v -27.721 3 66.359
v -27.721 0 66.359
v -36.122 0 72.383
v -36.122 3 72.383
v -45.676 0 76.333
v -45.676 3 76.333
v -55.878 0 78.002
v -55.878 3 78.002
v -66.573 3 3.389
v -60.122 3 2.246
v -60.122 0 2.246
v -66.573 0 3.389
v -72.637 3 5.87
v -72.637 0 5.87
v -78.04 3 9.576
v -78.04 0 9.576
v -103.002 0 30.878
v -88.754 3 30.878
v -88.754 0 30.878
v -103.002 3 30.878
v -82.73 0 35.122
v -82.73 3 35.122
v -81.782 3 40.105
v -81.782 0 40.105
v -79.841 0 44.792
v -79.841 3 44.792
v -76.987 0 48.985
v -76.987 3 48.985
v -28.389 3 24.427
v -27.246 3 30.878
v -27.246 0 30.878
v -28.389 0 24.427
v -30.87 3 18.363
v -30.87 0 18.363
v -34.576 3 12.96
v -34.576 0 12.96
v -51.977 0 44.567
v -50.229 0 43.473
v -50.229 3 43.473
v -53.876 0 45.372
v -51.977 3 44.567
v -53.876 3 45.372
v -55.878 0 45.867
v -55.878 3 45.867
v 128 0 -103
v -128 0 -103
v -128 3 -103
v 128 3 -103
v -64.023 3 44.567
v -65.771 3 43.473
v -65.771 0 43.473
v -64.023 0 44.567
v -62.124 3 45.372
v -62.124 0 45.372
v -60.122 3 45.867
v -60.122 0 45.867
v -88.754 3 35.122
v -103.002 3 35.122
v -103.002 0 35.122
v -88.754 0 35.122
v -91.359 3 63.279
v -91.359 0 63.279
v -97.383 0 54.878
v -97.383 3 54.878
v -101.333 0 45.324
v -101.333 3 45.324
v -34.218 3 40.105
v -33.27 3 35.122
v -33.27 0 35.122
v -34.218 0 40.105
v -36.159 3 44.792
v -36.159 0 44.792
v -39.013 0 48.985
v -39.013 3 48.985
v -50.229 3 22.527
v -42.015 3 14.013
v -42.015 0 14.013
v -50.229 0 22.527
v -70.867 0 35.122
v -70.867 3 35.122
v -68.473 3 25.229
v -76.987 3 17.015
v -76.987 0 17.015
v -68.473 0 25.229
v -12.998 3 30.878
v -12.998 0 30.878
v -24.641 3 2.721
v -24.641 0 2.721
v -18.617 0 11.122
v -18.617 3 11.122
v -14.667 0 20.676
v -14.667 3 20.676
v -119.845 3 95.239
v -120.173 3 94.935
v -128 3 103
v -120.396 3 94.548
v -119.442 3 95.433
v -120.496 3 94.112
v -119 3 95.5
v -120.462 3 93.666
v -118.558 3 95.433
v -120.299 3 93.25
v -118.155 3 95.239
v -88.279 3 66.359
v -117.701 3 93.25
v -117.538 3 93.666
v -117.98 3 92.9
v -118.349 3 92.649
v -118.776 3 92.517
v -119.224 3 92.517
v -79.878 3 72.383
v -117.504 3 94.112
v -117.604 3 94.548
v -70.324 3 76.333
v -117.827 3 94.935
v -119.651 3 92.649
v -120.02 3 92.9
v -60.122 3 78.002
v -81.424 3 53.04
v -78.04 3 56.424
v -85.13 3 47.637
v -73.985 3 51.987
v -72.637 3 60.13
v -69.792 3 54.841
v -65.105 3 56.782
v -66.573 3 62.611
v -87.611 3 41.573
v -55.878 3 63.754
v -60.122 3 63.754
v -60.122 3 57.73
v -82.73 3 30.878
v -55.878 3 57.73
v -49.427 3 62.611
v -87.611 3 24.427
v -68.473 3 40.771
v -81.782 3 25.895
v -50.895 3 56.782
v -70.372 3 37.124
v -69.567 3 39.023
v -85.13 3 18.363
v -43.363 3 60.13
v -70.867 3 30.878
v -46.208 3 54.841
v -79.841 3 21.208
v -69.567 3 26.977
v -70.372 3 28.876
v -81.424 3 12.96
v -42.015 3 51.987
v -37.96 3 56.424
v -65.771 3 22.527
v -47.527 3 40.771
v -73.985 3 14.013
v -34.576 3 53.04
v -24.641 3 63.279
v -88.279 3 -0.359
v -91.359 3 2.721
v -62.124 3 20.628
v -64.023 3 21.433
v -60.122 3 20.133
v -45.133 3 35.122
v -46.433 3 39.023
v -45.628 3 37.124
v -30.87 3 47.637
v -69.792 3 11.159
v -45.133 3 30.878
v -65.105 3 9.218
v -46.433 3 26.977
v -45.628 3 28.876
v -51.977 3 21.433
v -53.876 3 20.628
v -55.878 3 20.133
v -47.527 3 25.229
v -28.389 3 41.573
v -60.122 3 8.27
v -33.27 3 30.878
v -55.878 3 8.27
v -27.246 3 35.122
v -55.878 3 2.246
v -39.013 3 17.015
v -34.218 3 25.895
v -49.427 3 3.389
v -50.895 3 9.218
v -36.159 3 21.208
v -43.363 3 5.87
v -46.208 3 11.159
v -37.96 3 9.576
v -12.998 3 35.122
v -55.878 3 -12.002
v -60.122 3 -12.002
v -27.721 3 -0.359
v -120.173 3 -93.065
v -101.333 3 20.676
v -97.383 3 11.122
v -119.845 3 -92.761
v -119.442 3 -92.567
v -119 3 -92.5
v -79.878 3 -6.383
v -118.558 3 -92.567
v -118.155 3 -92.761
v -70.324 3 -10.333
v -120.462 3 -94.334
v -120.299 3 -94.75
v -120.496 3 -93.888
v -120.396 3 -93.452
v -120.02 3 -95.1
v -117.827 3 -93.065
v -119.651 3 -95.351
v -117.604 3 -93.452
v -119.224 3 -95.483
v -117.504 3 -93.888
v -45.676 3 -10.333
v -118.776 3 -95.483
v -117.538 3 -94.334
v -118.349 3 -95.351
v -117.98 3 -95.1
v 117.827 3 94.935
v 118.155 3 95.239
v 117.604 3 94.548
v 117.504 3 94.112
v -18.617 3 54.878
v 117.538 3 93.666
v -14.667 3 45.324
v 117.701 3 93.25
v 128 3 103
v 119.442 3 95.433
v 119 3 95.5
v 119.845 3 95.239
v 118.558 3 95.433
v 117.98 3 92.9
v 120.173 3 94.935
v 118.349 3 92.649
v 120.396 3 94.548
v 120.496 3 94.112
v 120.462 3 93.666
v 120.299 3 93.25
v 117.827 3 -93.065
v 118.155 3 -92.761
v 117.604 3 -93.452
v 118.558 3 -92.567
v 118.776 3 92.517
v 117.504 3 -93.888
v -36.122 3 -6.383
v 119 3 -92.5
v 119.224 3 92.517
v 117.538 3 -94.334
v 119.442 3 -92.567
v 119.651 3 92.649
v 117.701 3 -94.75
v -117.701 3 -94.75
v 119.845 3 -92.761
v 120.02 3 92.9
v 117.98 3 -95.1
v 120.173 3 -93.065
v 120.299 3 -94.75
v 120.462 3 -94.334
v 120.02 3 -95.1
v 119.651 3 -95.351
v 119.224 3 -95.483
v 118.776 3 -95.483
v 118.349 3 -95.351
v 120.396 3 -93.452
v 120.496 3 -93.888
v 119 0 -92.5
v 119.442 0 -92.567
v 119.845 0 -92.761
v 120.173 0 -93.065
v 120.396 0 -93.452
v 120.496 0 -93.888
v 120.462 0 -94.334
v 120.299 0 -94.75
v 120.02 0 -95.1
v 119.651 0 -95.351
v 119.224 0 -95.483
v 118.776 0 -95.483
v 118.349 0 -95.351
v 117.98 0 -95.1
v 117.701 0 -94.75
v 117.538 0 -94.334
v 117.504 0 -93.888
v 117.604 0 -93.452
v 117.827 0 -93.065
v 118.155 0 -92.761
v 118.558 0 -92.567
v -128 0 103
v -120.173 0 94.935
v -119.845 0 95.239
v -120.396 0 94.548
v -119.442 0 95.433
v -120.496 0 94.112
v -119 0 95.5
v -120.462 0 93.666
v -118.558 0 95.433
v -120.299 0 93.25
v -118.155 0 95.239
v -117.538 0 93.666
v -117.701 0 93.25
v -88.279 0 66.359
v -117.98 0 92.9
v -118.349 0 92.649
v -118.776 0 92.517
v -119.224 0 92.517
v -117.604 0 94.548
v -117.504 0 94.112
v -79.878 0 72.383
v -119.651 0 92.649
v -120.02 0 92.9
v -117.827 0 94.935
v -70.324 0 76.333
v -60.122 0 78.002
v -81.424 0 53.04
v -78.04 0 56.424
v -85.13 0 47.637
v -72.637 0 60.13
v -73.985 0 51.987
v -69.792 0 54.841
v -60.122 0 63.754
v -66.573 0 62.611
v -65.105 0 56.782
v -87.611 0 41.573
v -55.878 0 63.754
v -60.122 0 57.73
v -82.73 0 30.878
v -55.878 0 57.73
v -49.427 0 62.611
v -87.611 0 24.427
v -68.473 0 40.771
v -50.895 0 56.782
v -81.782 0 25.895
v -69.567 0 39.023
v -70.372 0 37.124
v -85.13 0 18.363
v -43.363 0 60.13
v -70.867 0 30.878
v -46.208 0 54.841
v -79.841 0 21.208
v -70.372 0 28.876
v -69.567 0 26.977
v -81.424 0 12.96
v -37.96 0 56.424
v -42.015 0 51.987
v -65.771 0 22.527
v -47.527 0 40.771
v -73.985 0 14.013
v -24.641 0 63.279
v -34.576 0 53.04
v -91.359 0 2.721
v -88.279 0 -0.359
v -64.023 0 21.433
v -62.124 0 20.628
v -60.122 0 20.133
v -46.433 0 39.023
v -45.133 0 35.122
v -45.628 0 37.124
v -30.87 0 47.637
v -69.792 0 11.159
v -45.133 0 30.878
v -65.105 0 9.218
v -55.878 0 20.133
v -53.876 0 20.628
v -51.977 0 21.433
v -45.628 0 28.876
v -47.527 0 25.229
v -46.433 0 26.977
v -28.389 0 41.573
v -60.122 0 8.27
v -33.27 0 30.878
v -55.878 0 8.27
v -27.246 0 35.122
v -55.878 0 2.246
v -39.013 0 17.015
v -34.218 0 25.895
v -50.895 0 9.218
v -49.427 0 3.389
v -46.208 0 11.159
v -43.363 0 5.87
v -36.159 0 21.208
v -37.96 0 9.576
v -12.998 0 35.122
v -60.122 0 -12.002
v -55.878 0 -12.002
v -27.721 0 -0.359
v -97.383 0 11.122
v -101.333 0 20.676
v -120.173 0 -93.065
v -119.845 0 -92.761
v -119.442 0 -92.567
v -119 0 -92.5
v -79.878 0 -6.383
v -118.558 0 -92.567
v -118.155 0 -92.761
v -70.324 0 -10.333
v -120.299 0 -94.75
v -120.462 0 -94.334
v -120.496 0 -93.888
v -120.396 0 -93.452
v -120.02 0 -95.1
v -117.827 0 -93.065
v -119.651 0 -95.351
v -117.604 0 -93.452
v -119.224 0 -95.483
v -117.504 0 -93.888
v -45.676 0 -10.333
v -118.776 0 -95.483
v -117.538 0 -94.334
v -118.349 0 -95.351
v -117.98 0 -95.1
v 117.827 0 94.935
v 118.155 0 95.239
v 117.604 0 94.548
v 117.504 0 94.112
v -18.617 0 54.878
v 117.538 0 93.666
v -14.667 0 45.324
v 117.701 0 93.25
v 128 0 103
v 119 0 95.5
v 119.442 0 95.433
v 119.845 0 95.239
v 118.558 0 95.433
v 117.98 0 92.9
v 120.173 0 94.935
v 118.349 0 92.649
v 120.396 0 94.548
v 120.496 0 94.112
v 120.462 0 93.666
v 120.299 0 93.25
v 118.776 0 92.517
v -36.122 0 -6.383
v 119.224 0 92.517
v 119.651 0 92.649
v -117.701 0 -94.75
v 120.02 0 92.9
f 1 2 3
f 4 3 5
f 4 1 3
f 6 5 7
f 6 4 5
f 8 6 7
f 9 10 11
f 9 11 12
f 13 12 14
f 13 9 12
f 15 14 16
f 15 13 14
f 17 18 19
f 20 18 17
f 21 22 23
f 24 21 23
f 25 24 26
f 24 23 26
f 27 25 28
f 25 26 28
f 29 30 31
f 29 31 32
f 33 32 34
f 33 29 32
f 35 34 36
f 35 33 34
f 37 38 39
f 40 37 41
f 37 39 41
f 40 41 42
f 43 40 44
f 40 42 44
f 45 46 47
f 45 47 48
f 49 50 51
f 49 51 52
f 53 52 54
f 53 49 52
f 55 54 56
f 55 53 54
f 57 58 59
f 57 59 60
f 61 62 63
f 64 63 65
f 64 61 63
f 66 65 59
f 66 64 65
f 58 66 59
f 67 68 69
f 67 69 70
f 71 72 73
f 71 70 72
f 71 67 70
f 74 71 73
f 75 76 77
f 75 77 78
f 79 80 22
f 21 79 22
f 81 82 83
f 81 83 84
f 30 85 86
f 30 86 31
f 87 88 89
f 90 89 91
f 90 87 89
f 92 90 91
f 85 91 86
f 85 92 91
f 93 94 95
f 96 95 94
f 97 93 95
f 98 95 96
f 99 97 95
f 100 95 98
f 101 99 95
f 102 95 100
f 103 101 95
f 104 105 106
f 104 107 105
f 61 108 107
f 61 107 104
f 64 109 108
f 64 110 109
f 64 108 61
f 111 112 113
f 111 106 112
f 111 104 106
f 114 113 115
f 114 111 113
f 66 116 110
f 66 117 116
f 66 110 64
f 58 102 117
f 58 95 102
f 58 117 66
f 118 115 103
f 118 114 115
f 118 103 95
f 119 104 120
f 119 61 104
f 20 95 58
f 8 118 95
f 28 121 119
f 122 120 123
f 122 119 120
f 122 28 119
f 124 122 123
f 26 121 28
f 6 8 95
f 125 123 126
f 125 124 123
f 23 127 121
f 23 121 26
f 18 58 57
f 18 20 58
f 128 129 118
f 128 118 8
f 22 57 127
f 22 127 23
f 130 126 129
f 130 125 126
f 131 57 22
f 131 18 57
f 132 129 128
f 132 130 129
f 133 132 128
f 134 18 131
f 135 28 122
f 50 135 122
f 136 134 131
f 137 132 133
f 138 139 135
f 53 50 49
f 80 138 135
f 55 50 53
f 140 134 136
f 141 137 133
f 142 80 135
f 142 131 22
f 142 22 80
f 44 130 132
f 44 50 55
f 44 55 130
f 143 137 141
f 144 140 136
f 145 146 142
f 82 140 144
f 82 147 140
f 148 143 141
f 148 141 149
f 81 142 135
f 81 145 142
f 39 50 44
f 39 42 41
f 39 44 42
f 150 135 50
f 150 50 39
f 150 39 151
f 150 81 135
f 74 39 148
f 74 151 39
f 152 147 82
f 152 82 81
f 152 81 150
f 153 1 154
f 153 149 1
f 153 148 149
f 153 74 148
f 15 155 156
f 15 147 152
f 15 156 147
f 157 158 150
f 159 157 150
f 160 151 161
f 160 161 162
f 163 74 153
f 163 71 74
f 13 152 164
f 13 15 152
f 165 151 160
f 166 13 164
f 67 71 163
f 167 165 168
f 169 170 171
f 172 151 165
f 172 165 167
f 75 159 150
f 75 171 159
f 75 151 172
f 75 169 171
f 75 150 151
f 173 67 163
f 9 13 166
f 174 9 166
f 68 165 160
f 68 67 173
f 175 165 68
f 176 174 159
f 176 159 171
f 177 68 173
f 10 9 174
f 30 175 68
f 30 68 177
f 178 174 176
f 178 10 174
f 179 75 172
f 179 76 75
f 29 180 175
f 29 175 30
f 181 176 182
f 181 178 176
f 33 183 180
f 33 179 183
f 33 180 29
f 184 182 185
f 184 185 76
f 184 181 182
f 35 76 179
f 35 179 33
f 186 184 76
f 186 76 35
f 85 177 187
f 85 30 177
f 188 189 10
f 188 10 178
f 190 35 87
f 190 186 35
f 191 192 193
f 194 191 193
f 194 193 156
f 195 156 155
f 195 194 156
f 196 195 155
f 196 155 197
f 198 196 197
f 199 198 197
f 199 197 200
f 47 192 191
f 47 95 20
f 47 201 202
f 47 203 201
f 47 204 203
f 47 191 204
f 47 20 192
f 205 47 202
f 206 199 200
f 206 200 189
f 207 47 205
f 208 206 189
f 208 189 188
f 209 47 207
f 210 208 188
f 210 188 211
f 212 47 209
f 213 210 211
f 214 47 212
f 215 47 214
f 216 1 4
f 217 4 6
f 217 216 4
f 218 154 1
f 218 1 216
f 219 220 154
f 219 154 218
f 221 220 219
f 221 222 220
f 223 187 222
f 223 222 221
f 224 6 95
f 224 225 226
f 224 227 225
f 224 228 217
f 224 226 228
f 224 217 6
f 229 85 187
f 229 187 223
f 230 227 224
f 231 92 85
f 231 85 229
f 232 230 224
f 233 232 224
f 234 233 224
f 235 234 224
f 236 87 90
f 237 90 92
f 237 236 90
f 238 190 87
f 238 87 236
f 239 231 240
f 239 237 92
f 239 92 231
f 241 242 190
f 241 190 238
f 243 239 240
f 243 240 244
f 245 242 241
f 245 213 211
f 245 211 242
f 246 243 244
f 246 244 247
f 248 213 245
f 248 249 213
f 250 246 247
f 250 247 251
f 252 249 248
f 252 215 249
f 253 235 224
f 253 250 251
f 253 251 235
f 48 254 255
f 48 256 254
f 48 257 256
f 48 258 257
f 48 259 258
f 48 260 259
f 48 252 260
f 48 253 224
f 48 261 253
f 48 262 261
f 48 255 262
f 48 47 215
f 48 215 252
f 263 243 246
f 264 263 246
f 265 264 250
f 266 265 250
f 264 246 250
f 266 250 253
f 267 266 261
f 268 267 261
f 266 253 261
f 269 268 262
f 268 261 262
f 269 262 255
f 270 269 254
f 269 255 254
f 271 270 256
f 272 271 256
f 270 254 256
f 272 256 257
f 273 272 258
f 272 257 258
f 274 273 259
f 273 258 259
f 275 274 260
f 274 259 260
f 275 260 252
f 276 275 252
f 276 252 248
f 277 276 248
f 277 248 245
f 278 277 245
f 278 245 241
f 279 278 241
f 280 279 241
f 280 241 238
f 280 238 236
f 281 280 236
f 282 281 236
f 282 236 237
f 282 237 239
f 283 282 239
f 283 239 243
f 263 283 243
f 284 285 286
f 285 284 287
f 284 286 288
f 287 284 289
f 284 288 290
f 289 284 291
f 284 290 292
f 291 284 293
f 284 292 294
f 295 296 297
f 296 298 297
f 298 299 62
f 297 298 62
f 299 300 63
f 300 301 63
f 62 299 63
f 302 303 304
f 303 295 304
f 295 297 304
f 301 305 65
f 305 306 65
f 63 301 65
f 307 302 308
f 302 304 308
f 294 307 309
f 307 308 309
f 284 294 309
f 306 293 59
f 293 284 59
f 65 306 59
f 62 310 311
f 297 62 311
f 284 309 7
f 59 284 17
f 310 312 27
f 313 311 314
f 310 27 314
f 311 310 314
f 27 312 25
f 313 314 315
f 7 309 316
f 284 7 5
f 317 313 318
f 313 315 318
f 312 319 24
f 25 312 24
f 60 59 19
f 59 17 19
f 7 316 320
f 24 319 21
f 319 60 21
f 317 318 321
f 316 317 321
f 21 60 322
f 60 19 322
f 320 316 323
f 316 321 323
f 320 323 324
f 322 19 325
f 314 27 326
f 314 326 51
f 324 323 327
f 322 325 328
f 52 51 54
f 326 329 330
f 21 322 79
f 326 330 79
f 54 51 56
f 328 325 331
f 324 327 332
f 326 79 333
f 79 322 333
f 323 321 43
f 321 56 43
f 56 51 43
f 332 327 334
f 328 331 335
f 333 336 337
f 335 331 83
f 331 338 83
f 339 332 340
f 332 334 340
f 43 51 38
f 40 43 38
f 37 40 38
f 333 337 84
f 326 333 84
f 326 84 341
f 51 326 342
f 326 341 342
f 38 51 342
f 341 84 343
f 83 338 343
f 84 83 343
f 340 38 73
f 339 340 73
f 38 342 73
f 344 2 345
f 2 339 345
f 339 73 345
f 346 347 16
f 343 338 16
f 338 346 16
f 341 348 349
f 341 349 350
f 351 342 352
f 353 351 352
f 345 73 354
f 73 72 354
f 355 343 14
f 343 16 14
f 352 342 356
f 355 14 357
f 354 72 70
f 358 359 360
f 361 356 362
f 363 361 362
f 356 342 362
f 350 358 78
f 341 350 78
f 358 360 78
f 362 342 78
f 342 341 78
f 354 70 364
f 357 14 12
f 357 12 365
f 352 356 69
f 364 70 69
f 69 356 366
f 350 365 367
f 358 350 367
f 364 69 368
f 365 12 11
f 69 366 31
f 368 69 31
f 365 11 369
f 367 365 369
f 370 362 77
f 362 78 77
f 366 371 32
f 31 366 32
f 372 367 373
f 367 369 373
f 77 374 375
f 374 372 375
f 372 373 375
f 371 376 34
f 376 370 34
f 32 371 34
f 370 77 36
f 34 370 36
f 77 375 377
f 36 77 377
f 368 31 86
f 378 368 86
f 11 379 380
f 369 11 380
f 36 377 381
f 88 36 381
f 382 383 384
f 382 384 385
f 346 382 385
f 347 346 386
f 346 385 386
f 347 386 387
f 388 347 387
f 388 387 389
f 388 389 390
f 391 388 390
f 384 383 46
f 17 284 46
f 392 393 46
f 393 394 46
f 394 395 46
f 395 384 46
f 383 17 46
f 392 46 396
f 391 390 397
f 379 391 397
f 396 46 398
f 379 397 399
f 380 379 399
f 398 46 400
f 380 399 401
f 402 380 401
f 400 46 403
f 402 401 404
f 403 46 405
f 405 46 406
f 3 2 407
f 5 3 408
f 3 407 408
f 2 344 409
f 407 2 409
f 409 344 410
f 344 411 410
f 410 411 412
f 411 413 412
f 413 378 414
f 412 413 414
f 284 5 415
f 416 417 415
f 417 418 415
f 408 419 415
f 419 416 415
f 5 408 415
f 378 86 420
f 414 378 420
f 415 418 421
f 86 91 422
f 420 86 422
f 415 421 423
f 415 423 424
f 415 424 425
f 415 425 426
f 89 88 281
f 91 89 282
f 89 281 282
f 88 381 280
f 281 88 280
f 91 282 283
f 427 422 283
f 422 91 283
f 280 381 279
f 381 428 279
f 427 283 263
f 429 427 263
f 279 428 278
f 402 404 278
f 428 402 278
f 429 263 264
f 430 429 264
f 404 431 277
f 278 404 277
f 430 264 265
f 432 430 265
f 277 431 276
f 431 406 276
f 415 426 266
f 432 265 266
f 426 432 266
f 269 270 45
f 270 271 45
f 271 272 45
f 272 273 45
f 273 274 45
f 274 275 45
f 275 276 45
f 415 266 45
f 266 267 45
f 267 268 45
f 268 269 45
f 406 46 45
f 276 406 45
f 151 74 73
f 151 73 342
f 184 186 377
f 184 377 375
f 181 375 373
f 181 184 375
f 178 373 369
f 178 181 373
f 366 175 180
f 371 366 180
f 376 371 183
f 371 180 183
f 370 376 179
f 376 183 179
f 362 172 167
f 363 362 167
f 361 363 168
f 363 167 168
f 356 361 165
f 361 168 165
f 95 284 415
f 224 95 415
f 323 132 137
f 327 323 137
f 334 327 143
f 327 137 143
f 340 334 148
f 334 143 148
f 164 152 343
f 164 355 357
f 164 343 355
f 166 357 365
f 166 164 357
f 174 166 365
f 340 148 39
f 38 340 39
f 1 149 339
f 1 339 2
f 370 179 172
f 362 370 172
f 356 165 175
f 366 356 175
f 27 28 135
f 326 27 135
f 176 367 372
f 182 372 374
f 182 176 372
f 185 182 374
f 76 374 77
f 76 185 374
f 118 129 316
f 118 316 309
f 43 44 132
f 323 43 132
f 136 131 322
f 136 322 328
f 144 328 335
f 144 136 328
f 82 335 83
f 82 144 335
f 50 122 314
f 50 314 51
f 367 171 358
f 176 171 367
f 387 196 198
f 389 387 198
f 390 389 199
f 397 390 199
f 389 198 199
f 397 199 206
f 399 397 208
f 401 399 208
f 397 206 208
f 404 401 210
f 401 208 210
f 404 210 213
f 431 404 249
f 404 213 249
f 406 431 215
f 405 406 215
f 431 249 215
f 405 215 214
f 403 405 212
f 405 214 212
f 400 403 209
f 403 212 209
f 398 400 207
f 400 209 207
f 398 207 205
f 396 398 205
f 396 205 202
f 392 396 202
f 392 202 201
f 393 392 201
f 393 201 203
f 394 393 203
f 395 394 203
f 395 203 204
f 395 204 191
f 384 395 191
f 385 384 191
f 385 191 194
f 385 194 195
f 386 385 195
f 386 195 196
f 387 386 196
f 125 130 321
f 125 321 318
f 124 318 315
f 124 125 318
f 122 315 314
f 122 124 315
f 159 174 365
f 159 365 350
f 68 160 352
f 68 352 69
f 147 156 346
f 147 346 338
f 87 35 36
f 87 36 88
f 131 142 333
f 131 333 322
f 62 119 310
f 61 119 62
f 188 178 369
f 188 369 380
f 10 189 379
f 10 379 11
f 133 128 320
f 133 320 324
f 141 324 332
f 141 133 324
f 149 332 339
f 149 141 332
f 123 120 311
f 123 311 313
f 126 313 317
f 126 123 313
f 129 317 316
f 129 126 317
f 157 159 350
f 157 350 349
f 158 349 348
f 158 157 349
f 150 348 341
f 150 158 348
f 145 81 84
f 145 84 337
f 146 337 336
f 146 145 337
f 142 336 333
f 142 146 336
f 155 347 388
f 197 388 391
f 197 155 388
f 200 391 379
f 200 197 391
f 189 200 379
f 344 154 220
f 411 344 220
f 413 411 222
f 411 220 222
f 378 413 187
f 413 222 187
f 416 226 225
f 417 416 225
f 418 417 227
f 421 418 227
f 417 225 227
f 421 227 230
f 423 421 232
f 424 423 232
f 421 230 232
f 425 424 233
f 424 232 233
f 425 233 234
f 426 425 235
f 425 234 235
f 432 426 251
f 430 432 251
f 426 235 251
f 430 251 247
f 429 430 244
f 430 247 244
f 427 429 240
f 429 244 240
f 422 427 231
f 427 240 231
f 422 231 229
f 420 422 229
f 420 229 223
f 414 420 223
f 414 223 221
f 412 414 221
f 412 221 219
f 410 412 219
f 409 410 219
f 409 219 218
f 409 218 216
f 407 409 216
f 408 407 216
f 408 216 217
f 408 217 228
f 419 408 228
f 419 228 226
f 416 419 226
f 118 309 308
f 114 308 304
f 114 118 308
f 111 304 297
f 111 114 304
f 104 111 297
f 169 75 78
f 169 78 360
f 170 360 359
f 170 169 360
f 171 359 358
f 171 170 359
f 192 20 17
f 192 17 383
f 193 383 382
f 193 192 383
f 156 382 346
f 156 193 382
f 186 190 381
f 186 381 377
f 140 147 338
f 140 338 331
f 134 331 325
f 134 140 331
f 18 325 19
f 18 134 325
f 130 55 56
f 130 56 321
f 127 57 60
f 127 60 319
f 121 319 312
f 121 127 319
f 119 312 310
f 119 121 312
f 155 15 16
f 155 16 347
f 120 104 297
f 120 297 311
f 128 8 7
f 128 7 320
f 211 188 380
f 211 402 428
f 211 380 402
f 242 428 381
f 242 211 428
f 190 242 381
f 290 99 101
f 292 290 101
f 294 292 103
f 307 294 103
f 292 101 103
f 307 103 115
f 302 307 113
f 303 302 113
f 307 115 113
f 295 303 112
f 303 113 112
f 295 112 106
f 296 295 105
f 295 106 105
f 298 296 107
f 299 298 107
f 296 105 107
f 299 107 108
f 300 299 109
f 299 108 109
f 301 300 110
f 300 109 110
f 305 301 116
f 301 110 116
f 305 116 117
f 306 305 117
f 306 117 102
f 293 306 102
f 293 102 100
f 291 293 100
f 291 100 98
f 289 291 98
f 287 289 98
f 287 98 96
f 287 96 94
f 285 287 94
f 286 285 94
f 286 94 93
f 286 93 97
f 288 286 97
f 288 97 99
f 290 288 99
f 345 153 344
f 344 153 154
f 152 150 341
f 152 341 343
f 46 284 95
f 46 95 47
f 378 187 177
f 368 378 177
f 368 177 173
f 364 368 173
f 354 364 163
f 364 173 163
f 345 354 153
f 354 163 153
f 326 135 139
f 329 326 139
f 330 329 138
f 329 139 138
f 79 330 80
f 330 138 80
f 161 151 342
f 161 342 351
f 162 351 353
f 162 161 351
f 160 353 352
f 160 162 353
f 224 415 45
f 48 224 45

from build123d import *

# Parameters (mm, degrees)
SKETCH1_W           = 256
SKETCH1_H           = 206
BOSS_EXTRUDE1_DEPTH = 3
SKETCH2_R           = 1.5
CUT_EXTRUDE3_DEPTH  = 4
CUT_EXTRUDE6_DEPTH  = 4


with BuildPart() as part:
    # Sketch1 → Boss-Extrude1 (new body)
    with BuildSketch(Plane(origin=(0, 0, 0), x_dir=(1, 0, 0), z_dir=(0, 1, 0))):
        Rectangle(SKETCH1_W, SKETCH1_H)
    extrude(amount=BOSS_EXTRUDE1_DEPTH)

    # Sketch2 → Cut-Extrude3 (cut)
    with BuildSketch(Plane(origin=(0, 3, 0), x_dir=(1, 0, 0), z_dir=(0, 1, 0))):
        with Locations(Location((-119, 94, 0), (0, 0, 270))):
            Circle(SKETCH2_R)
        with Locations(Location((119, 94, 0), (0, 0, 270))):
            Circle(SKETCH2_R)
        with Locations(Location((119, -94, 0), (0, 0, 270))):
            Circle(SKETCH2_R)
        with Locations(Location((-119, -94, 0), (0, 0, 270))):
            Circle(SKETCH2_R)
    extrude(amount=-CUT_EXTRUDE3_DEPTH, mode=Mode.SUBTRACT)

    # Sketch5 → Cut-Extrude6 (cut)
    with BuildSketch(Plane(origin=(0, 3, 0), x_dir=(1, 0, 0), z_dir=(0, 1, 0))):
        with BuildLine():
            Line((-45.132956232, -35.122138654), (-33.270497542, -35.122138654))
            ThreePointArc((-33.270497542, -35.122138654), (-35.068849242, -42.49810977), (-39.012684657, -48.985418992))
            Line((-39.012684657, -48.985418992), (-47.527093129, -40.770618345))
            ThreePointArc((-47.527093129, -40.770618345), (-45.993141349, -38.089168216), (-45.132956232, -35.122138654))
        make_face()
        with BuildLine():
            Line((-34.575640496, -53.039857249), (-24.640816296, -63.279340889))
            ThreePointArc((-24.640816296, -63.279340889), (-16.366822155, -50.214880906), (-12.998109488, -35.122138654))
            Line((-12.998109488, -35.122138654), (-27.246251867, -35.122138654))
            ThreePointArc((-27.246251867, -35.122138654), (-29.467947906, -44.671268141), (-34.575640496, -53.039857249))
        make_face()
        with BuildLine():
            Line((-37.960142751, -56.424359504), (-27.720659111, -66.359183704))
            ThreePointArc((-27.720659111, -66.359183704), (-40.785119094, -74.633177845), (-55.877861346, -78.001890512))
            Line((-55.877861346, -78.001890512), (-55.877861346, -63.753748133))
            ThreePointArc((-55.877861346, -63.753748133), (-46.328731859, -61.532052094), (-37.960142751, -56.424359504))
        make_face()
        with BuildLine():
            Line((-55.877861346, -45.867043768), (-55.877861346, -57.729502458))
            ThreePointArc((-55.877861346, -57.729502458), (-48.50189023, -55.931150758), (-42.014581008, -51.987315343))
            Line((-42.014581008, -51.987315343), (-50.229381655, -43.472906871))
            ThreePointArc((-50.229381655, -43.472906871), (-52.910831784, -45.006858651), (-55.877861346, -45.867043768))
        make_face()
        with BuildLine():
            Line((-55.877861346, -2.246251867), (-55.877861346, 12.001890512))
            ThreePointArc((-55.877861346, 12.001890512), (-40.785119094, 8.633177845), (-27.720659111, 0.359183704))
            Line((-27.720659111, 0.359183704), (-37.960142751, -9.575640496))
            ThreePointArc((-37.960142751, -9.575640496), (-46.328731859, -4.467947906), (-55.877861346, -2.246251867))
        make_face()
        with BuildLine():
            Line((-55.877861346, -20.132956232), (-55.877861346, -8.270497542))
            ThreePointArc((-55.877861346, -8.270497542), (-48.50189023, -10.068849242), (-42.014581008, -14.012684657))
            Line((-42.014581008, -14.012684657), (-50.229381655, -22.527093129))
            ThreePointArc((-50.229381655, -22.527093129), (-52.910831784, -20.993141349), (-55.877861346, -20.132956232))
        make_face()
        with BuildLine():
            Line((-34.575640496, -12.960142751), (-24.640816296, -2.720659111))
            ThreePointArc((-24.640816296, -2.720659111), (-16.366822155, -15.785119094), (-12.998109488, -30.877861346))
            Line((-12.998109488, -30.877861346), (-27.246251867, -30.877861346))
            ThreePointArc((-27.246251867, -30.877861346), (-29.467947906, -21.328731859), (-34.575640496, -12.960142751))
        make_face()
        with BuildLine():
            Line((-45.132956232, -30.877861346), (-33.270497542, -30.877861346))
            ThreePointArc((-33.270497542, -30.877861346), (-35.068849242, -23.50189023), (-39.012684657, -17.014581008))
            Line((-39.012684657, -17.014581008), (-47.527093129, -25.229381655))
            ThreePointArc((-47.527093129, -25.229381655), (-45.993141349, -27.910831784), (-45.132956232, -30.877861346))
        make_face()
        with BuildLine():
            Line((-60.122138654, -45.867043768), (-60.122138654, -57.729502458))
            ThreePointArc((-60.122138654, -57.729502458), (-67.49810977, -55.931150758), (-73.985418992, -51.987315343))
            Line((-73.985418992, -51.987315343), (-65.770618345, -43.472906871))
            ThreePointArc((-65.770618345, -43.472906871), (-63.089168216, -45.006858651), (-60.122138654, -45.867043768))
        make_face()
        with BuildLine():
            Line((-60.122138654, -63.753748133), (-60.122138654, -78.001890512))
            ThreePointArc((-60.122138654, -78.001890512), (-75.214880906, -74.633177845), (-88.279340889, -66.359183704))
            Line((-88.279340889, -66.359183704), (-78.039857249, -56.424359504))
            ThreePointArc((-78.039857249, -56.424359504), (-69.671268141, -61.532052094), (-60.122138654, -63.753748133))
        make_face()
        with BuildLine():
            Line((-81.424359504, -53.039857249), (-91.359183704, -63.279340889))
            ThreePointArc((-91.359183704, -63.279340889), (-99.633177845, -50.214880906), (-103.001890512, -35.122138654))
            Line((-103.001890512, -35.122138654), (-88.753748133, -35.122138654))
            ThreePointArc((-88.753748133, -35.122138654), (-86.532052094, -44.671268141), (-81.424359504, -53.039857249))
        make_face()
        with BuildLine():
            Line((-70.867043768, -35.122138654), (-82.729502458, -35.122138654))
            ThreePointArc((-82.729502458, -35.122138654), (-80.931150758, -42.49810977), (-76.987315343, -48.985418992))
            Line((-76.987315343, -48.985418992), (-68.472906871, -40.770618345))
            ThreePointArc((-68.472906871, -40.770618345), (-70.006858651, -38.089168216), (-70.867043768, -35.122138654))
        make_face()
        with BuildLine():
            Line((-88.753748133, -30.877861346), (-103.001890512, -30.877861346))
            ThreePointArc((-103.001890512, -30.877861346), (-99.633177845, -15.785119094), (-91.359183704, -2.720659111))
            Line((-91.359183704, -2.720659111), (-81.424359504, -12.960142751))
            ThreePointArc((-81.424359504, -12.960142751), (-86.532052094, -21.328731859), (-88.753748133, -30.877861346))
        make_face()
        with BuildLine():
            Line((-70.867043768, -30.877861346), (-82.729502458, -30.877861346))
            ThreePointArc((-82.729502458, -30.877861346), (-80.931150758, -23.50189023), (-76.987315343, -17.014581008))
            Line((-76.987315343, -17.014581008), (-68.472906871, -25.229381655))
            ThreePointArc((-68.472906871, -25.229381655), (-70.006858651, -27.910831784), (-70.867043768, -30.877861346))
        make_face()
        with BuildLine():
            Line((-65.770618345, -22.527093129), (-73.985418992, -14.012684657))
            ThreePointArc((-73.985418992, -14.012684657), (-67.49810977, -10.068849242), (-60.122138654, -8.270497542))
            Line((-60.122138654, -8.270497542), (-60.122138654, -20.132956232))
            ThreePointArc((-60.122138654, -20.132956232), (-63.089168216, -20.993141349), (-65.770618345, -22.527093129))
        make_face()
        with BuildLine():
            Line((-78.039857249, -9.575640496), (-88.279340889, 0.359183704))
            ThreePointArc((-88.279340889, 0.359183704), (-75.214880906, 8.633177845), (-60.122138654, 12.001890512))
            Line((-60.122138654, 12.001890512), (-60.122138654, -2.246251867))
            ThreePointArc((-60.122138654, -2.246251867), (-69.671268141, -4.467947906), (-78.039857249, -9.575640496))
        make_face()
    extrude(amount=-CUT_EXTRUDE6_DEPTH, mode=Mode.SUBTRACT)


solid = part.part
